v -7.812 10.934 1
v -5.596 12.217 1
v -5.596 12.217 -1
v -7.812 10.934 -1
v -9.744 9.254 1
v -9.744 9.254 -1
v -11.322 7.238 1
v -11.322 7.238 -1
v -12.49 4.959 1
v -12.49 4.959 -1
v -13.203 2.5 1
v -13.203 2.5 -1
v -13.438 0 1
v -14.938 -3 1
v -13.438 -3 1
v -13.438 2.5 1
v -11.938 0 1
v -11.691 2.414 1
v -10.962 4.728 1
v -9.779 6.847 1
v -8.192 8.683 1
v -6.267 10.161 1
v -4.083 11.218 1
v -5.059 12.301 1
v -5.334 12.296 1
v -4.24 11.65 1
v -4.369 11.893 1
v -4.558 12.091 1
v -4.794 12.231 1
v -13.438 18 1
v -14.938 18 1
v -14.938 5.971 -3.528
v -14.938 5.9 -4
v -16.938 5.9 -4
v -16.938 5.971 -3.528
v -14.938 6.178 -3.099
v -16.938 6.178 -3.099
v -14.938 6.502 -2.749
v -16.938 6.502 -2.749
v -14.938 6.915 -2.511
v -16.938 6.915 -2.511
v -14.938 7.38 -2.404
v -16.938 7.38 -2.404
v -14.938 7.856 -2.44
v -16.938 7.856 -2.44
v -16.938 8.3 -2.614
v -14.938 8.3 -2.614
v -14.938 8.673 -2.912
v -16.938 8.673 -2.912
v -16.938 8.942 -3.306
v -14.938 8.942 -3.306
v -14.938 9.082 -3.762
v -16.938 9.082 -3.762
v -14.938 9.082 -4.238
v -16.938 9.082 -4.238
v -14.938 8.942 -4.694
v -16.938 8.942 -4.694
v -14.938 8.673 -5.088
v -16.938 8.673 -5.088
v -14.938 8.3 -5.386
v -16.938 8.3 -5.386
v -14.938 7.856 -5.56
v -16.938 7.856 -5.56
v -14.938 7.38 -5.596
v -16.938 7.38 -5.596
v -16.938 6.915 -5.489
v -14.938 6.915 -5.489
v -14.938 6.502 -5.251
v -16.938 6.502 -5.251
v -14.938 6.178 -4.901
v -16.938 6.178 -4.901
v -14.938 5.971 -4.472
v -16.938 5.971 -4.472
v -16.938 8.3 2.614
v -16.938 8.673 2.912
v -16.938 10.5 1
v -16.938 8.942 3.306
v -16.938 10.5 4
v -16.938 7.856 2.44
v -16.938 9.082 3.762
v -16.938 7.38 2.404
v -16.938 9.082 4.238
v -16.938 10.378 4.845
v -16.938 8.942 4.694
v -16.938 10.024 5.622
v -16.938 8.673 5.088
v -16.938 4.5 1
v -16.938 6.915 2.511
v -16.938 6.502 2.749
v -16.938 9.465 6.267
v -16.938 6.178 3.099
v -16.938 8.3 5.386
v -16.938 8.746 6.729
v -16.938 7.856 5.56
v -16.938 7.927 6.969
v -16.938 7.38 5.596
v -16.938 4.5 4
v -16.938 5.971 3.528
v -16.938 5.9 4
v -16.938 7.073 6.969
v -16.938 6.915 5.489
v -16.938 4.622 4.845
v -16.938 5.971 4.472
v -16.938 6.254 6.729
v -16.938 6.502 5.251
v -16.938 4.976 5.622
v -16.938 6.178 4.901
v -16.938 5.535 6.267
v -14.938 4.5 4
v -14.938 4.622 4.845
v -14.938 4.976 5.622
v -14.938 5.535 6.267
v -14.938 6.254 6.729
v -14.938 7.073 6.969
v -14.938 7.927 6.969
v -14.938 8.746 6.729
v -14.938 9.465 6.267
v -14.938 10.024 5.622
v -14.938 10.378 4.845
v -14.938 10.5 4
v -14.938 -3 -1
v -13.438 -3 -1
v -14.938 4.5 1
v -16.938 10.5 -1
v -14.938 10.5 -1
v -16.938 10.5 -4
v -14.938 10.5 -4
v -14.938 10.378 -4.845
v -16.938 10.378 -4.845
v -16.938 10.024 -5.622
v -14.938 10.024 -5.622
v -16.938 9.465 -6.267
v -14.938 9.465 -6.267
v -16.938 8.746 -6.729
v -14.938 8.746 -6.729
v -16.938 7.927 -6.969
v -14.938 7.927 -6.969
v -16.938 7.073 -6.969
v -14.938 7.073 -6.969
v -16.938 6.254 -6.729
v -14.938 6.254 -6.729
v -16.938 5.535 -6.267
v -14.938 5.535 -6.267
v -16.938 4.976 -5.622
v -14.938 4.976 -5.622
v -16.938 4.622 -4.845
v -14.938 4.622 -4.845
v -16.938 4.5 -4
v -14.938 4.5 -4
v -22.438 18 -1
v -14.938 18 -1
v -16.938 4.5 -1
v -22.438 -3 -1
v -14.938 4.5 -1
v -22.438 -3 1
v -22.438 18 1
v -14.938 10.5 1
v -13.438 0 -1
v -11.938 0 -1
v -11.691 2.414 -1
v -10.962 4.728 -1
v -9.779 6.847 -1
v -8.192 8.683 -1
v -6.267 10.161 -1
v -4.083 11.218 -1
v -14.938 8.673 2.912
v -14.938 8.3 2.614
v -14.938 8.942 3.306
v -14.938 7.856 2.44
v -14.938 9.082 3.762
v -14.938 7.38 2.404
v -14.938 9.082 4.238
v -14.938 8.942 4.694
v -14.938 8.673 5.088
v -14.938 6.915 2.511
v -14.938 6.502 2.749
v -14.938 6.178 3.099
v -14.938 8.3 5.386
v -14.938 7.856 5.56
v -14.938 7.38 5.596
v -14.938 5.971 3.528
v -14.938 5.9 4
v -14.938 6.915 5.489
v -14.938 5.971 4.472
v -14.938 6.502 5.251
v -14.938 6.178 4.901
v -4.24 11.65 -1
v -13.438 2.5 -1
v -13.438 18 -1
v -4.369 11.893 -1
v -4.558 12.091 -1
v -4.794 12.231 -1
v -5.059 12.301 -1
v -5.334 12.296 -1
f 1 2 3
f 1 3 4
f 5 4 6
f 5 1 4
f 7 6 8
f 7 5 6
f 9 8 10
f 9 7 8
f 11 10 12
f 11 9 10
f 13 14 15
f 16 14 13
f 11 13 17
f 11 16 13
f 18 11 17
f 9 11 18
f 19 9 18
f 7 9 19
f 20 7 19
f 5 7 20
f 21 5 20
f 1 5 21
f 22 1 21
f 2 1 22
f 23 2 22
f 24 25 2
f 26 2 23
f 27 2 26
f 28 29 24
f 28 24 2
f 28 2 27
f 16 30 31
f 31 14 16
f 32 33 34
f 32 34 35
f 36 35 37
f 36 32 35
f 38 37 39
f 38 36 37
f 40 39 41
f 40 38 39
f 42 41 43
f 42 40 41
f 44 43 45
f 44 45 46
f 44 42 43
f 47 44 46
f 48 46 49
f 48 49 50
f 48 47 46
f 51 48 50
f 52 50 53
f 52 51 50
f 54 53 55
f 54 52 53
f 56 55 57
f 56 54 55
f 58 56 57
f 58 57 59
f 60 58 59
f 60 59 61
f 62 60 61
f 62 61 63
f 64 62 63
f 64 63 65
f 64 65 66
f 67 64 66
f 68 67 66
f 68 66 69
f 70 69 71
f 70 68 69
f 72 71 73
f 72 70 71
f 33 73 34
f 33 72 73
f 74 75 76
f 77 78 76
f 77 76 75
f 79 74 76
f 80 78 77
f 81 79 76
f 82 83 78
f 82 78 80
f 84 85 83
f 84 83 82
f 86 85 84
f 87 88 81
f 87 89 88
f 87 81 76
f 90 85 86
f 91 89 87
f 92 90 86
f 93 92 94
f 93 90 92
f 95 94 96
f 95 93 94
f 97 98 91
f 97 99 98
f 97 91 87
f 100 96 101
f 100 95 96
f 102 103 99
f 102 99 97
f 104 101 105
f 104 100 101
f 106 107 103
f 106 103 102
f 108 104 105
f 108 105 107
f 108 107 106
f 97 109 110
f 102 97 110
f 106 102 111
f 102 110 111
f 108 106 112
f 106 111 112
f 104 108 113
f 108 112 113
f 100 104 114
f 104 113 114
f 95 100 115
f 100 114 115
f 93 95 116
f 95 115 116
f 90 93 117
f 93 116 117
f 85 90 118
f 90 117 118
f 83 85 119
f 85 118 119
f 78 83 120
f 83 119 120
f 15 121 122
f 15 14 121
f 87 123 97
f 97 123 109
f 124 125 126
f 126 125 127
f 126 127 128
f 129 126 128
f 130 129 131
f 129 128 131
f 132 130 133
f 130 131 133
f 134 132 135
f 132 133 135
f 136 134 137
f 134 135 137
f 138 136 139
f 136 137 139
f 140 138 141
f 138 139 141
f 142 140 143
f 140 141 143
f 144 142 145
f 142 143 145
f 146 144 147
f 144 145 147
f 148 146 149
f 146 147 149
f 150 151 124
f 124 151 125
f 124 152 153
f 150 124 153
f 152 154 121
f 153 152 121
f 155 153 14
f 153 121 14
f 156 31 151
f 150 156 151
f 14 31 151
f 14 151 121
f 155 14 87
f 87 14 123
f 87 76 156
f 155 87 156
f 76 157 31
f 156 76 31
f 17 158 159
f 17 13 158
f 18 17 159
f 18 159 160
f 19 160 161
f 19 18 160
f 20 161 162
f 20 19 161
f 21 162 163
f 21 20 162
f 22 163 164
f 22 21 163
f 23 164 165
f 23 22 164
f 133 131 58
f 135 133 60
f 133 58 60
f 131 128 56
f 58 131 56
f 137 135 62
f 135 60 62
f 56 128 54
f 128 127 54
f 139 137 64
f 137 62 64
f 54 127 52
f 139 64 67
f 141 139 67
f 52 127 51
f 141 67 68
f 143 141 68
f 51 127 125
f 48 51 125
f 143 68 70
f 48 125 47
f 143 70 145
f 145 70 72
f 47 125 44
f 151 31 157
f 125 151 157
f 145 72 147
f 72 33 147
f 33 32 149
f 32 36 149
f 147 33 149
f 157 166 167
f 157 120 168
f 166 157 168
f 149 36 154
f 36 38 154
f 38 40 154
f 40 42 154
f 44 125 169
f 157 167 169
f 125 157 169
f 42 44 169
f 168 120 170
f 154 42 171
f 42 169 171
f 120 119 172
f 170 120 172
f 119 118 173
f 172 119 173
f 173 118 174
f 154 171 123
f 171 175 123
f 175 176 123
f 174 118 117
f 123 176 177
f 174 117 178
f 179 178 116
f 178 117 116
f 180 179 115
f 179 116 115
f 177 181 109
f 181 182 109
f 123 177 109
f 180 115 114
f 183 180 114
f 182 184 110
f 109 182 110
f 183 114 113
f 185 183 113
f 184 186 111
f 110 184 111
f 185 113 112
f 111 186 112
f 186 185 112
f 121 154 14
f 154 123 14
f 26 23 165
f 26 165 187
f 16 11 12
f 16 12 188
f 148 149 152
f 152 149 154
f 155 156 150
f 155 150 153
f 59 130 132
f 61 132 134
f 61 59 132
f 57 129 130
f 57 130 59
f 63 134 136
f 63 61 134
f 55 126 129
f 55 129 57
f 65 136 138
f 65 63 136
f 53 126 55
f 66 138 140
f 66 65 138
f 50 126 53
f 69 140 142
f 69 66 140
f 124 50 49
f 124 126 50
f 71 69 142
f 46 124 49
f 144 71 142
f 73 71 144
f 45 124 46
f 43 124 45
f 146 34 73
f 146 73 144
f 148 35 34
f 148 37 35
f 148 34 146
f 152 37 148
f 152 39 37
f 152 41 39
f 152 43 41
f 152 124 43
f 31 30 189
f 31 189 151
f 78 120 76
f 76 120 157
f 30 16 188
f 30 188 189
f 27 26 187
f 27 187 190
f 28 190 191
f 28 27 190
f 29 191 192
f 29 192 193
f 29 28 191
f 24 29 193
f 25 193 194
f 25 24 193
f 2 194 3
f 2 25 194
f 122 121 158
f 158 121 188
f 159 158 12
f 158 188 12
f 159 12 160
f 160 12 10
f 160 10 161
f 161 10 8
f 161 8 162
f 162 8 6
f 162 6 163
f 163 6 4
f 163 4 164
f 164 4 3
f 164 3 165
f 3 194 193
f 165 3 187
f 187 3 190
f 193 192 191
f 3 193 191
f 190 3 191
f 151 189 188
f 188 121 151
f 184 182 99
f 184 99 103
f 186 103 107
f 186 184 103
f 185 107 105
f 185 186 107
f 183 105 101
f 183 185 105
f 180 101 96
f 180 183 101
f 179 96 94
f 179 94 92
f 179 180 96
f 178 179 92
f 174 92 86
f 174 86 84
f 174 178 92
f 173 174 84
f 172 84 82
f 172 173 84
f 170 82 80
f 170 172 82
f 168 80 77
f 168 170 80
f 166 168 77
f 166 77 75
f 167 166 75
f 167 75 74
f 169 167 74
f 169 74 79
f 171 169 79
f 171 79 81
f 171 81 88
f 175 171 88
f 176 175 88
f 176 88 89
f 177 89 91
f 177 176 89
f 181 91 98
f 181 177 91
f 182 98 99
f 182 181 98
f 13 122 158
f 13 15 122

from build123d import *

# Parameters (mm, degrees)
F1_DEPTH = 1
F2_R     = 1.6
F3_DEPTH = 2
F5_DEPTH = 5.5


with BuildPart() as f1:
    # F0 (on Top) → F1 (new body, symmetric)
    with BuildSketch(Plane.XY):
        with BuildLine():
            Line((-13.438, 0), (-11.938, 0))
            ThreePointArc((-11.938, 0), (-9.779037, 6.847355), (-4.083036, 11.218051))
            Line((-4.083036, 11.218051), (-4.240275, 11.650061))
            ThreePointArc((-4.240275, 11.650061), (-4.794154, 12.230617), (-5.596431, 12.217193))
            ThreePointArc((-5.596431, 12.217193), (-10.581323, 8.283444), (-13.203403, 2.5))
            ThreePointArc((-13.203403, 2.5), (-13.379222, 1.255492), (-13.438, 0))
        make_face()
        Polygon((-13.438, -3), (-13.438, 0), (-13.438, 2.5), (-13.438, 18), (-14.938, 18), (-14.938, -3), align=None)
        with BuildLine():
            Line((-13.438, 2.5), (-13.438, 0))
            ThreePointArc((-13.438, 0), (-13.379222, 1.255492), (-13.203403, 2.5))
            Line((-13.203403, 2.5), (-13.438, 2.5))
        make_face()
    extrude(amount=F1_DEPTH, both=True)


with BuildPart() as f3:
    # F2 (on face) → F3 (new body)
    with BuildSketch(Plane(origin=(-14.938, 0, 0), x_dir=(0, -1, 0), z_dir=(-1, 0, 0))):
        Polygon((-18, 1), (-18, -1), (-10.5, -1), (-4.5, -1), (3, -1), (3, 1), (-4.5, 1), (-10.5, 1), align=None)
        with BuildLine():
            Line((-4.5, -1), (-10.5, -1))
            Line((-10.5, -1), (-10.5, -4))
            ThreePointArc((-10.5, -4), (-7.5, -7), (-4.5, -4))
            Line((-4.5, -4), (-4.5, -1))
        make_face()
        with Locations((-7.5, -4)):
            Circle(F2_R, mode=Mode.SUBTRACT)
        with BuildLine():
            Line((-10.5, 4), (-10.5, 1))
            Line((-10.5, 1), (-4.5, 1))
            Line((-4.5, 1), (-4.5, 4))
            ThreePointArc((-4.5, 4), (-7.5, 7), (-10.5, 4))
        make_face()
        with Locations((-7.5, 4)):
            Circle(F2_R, mode=Mode.SUBTRACT)
    extrude(amount=F3_DEPTH)

    # F4 (on face) → F5 (join)
    with BuildSketch(Plane(origin=(-16.938, 0, 0), x_dir=(0, -1, 0), z_dir=(-1, 0, 0))):
        Polygon((-18, 1), (-18, -1), (-10.5, -1), (-4.5, -1), (3, -1), (3, 1), (-4.5, 1), (-10.5, 1), align=None)
    extrude(amount=F5_DEPTH)


solid = Compound([f1.part, f3.part])
